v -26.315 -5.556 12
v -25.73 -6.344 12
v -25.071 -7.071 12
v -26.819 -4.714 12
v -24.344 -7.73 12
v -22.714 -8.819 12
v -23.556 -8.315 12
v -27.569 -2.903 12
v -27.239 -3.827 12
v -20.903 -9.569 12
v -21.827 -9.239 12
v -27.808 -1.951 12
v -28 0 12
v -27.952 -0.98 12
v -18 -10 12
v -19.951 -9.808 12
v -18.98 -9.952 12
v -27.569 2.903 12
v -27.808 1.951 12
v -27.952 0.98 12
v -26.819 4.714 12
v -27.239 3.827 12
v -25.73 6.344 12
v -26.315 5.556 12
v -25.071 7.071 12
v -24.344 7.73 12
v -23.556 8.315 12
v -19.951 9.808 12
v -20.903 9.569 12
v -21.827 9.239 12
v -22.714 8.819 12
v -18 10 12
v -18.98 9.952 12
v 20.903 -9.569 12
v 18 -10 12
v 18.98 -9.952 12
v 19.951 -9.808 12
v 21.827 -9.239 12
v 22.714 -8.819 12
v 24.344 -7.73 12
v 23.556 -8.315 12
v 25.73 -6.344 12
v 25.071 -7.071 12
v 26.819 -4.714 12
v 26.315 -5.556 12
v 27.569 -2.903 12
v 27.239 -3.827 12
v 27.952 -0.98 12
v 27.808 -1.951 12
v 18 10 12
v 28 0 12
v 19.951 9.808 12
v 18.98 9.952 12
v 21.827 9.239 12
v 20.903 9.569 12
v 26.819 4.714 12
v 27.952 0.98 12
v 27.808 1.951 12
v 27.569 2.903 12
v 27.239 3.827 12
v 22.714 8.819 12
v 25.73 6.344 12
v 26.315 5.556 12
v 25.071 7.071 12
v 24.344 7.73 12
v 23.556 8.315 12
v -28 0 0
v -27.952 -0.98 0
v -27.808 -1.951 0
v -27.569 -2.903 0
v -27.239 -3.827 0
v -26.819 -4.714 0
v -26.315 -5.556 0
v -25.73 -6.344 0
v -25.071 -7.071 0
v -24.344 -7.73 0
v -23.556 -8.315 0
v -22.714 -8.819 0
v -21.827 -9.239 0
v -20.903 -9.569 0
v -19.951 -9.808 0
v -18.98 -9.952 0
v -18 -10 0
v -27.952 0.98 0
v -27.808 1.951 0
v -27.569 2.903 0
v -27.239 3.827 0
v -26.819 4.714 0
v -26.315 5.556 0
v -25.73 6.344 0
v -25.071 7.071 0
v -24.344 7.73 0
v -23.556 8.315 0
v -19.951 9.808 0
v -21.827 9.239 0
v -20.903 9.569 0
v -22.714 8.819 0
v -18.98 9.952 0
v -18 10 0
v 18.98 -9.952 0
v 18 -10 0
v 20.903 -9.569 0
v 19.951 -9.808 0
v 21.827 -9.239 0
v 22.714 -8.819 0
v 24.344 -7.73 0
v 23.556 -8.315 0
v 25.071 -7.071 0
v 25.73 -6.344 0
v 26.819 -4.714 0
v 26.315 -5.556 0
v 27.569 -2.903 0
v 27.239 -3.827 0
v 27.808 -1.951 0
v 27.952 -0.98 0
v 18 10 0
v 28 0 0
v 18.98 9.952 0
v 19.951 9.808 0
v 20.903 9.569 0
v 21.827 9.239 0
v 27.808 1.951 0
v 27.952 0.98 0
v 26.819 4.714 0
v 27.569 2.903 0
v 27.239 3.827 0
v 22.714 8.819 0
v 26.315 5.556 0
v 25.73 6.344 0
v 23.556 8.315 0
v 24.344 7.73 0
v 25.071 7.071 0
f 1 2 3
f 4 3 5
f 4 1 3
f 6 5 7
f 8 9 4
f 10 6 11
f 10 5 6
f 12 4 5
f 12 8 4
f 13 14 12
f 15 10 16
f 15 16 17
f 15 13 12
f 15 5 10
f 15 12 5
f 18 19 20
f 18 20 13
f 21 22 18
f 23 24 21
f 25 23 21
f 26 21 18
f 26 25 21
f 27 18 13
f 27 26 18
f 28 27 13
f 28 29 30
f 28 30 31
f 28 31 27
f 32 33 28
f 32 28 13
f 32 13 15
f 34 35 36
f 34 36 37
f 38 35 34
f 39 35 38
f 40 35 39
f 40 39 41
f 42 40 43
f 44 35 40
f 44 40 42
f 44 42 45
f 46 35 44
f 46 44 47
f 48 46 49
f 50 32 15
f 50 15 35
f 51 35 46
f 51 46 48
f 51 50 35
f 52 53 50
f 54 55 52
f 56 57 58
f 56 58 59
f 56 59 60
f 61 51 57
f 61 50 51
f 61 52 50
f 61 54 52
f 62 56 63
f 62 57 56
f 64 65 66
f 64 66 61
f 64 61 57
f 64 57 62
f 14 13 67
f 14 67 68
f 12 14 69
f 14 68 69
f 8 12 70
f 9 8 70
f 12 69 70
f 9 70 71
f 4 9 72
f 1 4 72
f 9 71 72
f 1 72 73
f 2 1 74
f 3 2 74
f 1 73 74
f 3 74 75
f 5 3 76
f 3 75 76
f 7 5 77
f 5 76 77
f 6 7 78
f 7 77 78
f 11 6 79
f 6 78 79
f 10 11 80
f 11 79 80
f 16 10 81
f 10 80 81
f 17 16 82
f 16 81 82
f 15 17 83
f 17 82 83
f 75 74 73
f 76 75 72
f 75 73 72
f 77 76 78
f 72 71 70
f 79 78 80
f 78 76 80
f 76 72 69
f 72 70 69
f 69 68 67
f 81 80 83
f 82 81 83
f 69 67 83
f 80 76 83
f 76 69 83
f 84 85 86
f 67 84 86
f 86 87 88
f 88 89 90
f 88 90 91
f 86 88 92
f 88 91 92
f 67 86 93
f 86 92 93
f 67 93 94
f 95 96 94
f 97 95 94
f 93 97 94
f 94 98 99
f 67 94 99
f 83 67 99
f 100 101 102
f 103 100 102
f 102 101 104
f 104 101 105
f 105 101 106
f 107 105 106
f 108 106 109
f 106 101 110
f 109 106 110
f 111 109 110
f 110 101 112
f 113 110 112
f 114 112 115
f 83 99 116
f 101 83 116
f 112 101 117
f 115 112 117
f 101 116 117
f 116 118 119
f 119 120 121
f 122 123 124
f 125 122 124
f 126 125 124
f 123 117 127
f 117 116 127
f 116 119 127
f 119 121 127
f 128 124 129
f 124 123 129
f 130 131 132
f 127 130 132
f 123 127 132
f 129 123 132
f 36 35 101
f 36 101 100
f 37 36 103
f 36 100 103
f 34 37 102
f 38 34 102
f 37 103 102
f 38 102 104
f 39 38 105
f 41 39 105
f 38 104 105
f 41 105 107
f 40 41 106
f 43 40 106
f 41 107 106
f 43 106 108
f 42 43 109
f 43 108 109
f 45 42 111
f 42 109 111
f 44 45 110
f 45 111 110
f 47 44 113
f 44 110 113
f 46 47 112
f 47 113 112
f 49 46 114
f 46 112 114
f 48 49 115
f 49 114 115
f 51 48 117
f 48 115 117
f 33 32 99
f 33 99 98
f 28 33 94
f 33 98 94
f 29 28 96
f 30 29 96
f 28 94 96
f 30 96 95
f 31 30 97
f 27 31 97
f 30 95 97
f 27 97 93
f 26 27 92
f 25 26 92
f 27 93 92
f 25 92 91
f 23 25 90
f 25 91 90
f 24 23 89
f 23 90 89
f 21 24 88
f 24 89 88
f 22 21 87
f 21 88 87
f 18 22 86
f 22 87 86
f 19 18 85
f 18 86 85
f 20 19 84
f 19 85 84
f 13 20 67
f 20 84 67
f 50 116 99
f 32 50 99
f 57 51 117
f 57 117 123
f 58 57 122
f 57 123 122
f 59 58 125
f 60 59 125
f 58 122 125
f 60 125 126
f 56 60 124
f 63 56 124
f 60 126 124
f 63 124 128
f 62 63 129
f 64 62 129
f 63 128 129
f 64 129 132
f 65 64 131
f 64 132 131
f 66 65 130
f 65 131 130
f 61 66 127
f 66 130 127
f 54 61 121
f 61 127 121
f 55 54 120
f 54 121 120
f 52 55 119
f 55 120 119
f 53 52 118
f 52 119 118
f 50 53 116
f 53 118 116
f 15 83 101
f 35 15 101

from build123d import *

# Parameters (mm, degrees)
F1_DEPTH = 12


with BuildPart() as f1:
    # F0 (on Top) → F1 (new body)
    with BuildSketch(Plane.XY):
        with BuildLine():
            ThreePointArc((28, 0), (25.071068, 7.071068), (18, 10))
            Line((18, 10), (-18, 10))
            ThreePointArc((-18, 10), (-25.071068, 7.071068), (-28, 0))
            ThreePointArc((-28, 0), (-25.071068, -7.071068), (-18, -10))
            Line((-18, -10), (18, -10))
            ThreePointArc((18, -10), (25.071068, -7.071068), (28, 0))
        make_face()
    extrude(amount=F1_DEPTH)


solid = f1.part
